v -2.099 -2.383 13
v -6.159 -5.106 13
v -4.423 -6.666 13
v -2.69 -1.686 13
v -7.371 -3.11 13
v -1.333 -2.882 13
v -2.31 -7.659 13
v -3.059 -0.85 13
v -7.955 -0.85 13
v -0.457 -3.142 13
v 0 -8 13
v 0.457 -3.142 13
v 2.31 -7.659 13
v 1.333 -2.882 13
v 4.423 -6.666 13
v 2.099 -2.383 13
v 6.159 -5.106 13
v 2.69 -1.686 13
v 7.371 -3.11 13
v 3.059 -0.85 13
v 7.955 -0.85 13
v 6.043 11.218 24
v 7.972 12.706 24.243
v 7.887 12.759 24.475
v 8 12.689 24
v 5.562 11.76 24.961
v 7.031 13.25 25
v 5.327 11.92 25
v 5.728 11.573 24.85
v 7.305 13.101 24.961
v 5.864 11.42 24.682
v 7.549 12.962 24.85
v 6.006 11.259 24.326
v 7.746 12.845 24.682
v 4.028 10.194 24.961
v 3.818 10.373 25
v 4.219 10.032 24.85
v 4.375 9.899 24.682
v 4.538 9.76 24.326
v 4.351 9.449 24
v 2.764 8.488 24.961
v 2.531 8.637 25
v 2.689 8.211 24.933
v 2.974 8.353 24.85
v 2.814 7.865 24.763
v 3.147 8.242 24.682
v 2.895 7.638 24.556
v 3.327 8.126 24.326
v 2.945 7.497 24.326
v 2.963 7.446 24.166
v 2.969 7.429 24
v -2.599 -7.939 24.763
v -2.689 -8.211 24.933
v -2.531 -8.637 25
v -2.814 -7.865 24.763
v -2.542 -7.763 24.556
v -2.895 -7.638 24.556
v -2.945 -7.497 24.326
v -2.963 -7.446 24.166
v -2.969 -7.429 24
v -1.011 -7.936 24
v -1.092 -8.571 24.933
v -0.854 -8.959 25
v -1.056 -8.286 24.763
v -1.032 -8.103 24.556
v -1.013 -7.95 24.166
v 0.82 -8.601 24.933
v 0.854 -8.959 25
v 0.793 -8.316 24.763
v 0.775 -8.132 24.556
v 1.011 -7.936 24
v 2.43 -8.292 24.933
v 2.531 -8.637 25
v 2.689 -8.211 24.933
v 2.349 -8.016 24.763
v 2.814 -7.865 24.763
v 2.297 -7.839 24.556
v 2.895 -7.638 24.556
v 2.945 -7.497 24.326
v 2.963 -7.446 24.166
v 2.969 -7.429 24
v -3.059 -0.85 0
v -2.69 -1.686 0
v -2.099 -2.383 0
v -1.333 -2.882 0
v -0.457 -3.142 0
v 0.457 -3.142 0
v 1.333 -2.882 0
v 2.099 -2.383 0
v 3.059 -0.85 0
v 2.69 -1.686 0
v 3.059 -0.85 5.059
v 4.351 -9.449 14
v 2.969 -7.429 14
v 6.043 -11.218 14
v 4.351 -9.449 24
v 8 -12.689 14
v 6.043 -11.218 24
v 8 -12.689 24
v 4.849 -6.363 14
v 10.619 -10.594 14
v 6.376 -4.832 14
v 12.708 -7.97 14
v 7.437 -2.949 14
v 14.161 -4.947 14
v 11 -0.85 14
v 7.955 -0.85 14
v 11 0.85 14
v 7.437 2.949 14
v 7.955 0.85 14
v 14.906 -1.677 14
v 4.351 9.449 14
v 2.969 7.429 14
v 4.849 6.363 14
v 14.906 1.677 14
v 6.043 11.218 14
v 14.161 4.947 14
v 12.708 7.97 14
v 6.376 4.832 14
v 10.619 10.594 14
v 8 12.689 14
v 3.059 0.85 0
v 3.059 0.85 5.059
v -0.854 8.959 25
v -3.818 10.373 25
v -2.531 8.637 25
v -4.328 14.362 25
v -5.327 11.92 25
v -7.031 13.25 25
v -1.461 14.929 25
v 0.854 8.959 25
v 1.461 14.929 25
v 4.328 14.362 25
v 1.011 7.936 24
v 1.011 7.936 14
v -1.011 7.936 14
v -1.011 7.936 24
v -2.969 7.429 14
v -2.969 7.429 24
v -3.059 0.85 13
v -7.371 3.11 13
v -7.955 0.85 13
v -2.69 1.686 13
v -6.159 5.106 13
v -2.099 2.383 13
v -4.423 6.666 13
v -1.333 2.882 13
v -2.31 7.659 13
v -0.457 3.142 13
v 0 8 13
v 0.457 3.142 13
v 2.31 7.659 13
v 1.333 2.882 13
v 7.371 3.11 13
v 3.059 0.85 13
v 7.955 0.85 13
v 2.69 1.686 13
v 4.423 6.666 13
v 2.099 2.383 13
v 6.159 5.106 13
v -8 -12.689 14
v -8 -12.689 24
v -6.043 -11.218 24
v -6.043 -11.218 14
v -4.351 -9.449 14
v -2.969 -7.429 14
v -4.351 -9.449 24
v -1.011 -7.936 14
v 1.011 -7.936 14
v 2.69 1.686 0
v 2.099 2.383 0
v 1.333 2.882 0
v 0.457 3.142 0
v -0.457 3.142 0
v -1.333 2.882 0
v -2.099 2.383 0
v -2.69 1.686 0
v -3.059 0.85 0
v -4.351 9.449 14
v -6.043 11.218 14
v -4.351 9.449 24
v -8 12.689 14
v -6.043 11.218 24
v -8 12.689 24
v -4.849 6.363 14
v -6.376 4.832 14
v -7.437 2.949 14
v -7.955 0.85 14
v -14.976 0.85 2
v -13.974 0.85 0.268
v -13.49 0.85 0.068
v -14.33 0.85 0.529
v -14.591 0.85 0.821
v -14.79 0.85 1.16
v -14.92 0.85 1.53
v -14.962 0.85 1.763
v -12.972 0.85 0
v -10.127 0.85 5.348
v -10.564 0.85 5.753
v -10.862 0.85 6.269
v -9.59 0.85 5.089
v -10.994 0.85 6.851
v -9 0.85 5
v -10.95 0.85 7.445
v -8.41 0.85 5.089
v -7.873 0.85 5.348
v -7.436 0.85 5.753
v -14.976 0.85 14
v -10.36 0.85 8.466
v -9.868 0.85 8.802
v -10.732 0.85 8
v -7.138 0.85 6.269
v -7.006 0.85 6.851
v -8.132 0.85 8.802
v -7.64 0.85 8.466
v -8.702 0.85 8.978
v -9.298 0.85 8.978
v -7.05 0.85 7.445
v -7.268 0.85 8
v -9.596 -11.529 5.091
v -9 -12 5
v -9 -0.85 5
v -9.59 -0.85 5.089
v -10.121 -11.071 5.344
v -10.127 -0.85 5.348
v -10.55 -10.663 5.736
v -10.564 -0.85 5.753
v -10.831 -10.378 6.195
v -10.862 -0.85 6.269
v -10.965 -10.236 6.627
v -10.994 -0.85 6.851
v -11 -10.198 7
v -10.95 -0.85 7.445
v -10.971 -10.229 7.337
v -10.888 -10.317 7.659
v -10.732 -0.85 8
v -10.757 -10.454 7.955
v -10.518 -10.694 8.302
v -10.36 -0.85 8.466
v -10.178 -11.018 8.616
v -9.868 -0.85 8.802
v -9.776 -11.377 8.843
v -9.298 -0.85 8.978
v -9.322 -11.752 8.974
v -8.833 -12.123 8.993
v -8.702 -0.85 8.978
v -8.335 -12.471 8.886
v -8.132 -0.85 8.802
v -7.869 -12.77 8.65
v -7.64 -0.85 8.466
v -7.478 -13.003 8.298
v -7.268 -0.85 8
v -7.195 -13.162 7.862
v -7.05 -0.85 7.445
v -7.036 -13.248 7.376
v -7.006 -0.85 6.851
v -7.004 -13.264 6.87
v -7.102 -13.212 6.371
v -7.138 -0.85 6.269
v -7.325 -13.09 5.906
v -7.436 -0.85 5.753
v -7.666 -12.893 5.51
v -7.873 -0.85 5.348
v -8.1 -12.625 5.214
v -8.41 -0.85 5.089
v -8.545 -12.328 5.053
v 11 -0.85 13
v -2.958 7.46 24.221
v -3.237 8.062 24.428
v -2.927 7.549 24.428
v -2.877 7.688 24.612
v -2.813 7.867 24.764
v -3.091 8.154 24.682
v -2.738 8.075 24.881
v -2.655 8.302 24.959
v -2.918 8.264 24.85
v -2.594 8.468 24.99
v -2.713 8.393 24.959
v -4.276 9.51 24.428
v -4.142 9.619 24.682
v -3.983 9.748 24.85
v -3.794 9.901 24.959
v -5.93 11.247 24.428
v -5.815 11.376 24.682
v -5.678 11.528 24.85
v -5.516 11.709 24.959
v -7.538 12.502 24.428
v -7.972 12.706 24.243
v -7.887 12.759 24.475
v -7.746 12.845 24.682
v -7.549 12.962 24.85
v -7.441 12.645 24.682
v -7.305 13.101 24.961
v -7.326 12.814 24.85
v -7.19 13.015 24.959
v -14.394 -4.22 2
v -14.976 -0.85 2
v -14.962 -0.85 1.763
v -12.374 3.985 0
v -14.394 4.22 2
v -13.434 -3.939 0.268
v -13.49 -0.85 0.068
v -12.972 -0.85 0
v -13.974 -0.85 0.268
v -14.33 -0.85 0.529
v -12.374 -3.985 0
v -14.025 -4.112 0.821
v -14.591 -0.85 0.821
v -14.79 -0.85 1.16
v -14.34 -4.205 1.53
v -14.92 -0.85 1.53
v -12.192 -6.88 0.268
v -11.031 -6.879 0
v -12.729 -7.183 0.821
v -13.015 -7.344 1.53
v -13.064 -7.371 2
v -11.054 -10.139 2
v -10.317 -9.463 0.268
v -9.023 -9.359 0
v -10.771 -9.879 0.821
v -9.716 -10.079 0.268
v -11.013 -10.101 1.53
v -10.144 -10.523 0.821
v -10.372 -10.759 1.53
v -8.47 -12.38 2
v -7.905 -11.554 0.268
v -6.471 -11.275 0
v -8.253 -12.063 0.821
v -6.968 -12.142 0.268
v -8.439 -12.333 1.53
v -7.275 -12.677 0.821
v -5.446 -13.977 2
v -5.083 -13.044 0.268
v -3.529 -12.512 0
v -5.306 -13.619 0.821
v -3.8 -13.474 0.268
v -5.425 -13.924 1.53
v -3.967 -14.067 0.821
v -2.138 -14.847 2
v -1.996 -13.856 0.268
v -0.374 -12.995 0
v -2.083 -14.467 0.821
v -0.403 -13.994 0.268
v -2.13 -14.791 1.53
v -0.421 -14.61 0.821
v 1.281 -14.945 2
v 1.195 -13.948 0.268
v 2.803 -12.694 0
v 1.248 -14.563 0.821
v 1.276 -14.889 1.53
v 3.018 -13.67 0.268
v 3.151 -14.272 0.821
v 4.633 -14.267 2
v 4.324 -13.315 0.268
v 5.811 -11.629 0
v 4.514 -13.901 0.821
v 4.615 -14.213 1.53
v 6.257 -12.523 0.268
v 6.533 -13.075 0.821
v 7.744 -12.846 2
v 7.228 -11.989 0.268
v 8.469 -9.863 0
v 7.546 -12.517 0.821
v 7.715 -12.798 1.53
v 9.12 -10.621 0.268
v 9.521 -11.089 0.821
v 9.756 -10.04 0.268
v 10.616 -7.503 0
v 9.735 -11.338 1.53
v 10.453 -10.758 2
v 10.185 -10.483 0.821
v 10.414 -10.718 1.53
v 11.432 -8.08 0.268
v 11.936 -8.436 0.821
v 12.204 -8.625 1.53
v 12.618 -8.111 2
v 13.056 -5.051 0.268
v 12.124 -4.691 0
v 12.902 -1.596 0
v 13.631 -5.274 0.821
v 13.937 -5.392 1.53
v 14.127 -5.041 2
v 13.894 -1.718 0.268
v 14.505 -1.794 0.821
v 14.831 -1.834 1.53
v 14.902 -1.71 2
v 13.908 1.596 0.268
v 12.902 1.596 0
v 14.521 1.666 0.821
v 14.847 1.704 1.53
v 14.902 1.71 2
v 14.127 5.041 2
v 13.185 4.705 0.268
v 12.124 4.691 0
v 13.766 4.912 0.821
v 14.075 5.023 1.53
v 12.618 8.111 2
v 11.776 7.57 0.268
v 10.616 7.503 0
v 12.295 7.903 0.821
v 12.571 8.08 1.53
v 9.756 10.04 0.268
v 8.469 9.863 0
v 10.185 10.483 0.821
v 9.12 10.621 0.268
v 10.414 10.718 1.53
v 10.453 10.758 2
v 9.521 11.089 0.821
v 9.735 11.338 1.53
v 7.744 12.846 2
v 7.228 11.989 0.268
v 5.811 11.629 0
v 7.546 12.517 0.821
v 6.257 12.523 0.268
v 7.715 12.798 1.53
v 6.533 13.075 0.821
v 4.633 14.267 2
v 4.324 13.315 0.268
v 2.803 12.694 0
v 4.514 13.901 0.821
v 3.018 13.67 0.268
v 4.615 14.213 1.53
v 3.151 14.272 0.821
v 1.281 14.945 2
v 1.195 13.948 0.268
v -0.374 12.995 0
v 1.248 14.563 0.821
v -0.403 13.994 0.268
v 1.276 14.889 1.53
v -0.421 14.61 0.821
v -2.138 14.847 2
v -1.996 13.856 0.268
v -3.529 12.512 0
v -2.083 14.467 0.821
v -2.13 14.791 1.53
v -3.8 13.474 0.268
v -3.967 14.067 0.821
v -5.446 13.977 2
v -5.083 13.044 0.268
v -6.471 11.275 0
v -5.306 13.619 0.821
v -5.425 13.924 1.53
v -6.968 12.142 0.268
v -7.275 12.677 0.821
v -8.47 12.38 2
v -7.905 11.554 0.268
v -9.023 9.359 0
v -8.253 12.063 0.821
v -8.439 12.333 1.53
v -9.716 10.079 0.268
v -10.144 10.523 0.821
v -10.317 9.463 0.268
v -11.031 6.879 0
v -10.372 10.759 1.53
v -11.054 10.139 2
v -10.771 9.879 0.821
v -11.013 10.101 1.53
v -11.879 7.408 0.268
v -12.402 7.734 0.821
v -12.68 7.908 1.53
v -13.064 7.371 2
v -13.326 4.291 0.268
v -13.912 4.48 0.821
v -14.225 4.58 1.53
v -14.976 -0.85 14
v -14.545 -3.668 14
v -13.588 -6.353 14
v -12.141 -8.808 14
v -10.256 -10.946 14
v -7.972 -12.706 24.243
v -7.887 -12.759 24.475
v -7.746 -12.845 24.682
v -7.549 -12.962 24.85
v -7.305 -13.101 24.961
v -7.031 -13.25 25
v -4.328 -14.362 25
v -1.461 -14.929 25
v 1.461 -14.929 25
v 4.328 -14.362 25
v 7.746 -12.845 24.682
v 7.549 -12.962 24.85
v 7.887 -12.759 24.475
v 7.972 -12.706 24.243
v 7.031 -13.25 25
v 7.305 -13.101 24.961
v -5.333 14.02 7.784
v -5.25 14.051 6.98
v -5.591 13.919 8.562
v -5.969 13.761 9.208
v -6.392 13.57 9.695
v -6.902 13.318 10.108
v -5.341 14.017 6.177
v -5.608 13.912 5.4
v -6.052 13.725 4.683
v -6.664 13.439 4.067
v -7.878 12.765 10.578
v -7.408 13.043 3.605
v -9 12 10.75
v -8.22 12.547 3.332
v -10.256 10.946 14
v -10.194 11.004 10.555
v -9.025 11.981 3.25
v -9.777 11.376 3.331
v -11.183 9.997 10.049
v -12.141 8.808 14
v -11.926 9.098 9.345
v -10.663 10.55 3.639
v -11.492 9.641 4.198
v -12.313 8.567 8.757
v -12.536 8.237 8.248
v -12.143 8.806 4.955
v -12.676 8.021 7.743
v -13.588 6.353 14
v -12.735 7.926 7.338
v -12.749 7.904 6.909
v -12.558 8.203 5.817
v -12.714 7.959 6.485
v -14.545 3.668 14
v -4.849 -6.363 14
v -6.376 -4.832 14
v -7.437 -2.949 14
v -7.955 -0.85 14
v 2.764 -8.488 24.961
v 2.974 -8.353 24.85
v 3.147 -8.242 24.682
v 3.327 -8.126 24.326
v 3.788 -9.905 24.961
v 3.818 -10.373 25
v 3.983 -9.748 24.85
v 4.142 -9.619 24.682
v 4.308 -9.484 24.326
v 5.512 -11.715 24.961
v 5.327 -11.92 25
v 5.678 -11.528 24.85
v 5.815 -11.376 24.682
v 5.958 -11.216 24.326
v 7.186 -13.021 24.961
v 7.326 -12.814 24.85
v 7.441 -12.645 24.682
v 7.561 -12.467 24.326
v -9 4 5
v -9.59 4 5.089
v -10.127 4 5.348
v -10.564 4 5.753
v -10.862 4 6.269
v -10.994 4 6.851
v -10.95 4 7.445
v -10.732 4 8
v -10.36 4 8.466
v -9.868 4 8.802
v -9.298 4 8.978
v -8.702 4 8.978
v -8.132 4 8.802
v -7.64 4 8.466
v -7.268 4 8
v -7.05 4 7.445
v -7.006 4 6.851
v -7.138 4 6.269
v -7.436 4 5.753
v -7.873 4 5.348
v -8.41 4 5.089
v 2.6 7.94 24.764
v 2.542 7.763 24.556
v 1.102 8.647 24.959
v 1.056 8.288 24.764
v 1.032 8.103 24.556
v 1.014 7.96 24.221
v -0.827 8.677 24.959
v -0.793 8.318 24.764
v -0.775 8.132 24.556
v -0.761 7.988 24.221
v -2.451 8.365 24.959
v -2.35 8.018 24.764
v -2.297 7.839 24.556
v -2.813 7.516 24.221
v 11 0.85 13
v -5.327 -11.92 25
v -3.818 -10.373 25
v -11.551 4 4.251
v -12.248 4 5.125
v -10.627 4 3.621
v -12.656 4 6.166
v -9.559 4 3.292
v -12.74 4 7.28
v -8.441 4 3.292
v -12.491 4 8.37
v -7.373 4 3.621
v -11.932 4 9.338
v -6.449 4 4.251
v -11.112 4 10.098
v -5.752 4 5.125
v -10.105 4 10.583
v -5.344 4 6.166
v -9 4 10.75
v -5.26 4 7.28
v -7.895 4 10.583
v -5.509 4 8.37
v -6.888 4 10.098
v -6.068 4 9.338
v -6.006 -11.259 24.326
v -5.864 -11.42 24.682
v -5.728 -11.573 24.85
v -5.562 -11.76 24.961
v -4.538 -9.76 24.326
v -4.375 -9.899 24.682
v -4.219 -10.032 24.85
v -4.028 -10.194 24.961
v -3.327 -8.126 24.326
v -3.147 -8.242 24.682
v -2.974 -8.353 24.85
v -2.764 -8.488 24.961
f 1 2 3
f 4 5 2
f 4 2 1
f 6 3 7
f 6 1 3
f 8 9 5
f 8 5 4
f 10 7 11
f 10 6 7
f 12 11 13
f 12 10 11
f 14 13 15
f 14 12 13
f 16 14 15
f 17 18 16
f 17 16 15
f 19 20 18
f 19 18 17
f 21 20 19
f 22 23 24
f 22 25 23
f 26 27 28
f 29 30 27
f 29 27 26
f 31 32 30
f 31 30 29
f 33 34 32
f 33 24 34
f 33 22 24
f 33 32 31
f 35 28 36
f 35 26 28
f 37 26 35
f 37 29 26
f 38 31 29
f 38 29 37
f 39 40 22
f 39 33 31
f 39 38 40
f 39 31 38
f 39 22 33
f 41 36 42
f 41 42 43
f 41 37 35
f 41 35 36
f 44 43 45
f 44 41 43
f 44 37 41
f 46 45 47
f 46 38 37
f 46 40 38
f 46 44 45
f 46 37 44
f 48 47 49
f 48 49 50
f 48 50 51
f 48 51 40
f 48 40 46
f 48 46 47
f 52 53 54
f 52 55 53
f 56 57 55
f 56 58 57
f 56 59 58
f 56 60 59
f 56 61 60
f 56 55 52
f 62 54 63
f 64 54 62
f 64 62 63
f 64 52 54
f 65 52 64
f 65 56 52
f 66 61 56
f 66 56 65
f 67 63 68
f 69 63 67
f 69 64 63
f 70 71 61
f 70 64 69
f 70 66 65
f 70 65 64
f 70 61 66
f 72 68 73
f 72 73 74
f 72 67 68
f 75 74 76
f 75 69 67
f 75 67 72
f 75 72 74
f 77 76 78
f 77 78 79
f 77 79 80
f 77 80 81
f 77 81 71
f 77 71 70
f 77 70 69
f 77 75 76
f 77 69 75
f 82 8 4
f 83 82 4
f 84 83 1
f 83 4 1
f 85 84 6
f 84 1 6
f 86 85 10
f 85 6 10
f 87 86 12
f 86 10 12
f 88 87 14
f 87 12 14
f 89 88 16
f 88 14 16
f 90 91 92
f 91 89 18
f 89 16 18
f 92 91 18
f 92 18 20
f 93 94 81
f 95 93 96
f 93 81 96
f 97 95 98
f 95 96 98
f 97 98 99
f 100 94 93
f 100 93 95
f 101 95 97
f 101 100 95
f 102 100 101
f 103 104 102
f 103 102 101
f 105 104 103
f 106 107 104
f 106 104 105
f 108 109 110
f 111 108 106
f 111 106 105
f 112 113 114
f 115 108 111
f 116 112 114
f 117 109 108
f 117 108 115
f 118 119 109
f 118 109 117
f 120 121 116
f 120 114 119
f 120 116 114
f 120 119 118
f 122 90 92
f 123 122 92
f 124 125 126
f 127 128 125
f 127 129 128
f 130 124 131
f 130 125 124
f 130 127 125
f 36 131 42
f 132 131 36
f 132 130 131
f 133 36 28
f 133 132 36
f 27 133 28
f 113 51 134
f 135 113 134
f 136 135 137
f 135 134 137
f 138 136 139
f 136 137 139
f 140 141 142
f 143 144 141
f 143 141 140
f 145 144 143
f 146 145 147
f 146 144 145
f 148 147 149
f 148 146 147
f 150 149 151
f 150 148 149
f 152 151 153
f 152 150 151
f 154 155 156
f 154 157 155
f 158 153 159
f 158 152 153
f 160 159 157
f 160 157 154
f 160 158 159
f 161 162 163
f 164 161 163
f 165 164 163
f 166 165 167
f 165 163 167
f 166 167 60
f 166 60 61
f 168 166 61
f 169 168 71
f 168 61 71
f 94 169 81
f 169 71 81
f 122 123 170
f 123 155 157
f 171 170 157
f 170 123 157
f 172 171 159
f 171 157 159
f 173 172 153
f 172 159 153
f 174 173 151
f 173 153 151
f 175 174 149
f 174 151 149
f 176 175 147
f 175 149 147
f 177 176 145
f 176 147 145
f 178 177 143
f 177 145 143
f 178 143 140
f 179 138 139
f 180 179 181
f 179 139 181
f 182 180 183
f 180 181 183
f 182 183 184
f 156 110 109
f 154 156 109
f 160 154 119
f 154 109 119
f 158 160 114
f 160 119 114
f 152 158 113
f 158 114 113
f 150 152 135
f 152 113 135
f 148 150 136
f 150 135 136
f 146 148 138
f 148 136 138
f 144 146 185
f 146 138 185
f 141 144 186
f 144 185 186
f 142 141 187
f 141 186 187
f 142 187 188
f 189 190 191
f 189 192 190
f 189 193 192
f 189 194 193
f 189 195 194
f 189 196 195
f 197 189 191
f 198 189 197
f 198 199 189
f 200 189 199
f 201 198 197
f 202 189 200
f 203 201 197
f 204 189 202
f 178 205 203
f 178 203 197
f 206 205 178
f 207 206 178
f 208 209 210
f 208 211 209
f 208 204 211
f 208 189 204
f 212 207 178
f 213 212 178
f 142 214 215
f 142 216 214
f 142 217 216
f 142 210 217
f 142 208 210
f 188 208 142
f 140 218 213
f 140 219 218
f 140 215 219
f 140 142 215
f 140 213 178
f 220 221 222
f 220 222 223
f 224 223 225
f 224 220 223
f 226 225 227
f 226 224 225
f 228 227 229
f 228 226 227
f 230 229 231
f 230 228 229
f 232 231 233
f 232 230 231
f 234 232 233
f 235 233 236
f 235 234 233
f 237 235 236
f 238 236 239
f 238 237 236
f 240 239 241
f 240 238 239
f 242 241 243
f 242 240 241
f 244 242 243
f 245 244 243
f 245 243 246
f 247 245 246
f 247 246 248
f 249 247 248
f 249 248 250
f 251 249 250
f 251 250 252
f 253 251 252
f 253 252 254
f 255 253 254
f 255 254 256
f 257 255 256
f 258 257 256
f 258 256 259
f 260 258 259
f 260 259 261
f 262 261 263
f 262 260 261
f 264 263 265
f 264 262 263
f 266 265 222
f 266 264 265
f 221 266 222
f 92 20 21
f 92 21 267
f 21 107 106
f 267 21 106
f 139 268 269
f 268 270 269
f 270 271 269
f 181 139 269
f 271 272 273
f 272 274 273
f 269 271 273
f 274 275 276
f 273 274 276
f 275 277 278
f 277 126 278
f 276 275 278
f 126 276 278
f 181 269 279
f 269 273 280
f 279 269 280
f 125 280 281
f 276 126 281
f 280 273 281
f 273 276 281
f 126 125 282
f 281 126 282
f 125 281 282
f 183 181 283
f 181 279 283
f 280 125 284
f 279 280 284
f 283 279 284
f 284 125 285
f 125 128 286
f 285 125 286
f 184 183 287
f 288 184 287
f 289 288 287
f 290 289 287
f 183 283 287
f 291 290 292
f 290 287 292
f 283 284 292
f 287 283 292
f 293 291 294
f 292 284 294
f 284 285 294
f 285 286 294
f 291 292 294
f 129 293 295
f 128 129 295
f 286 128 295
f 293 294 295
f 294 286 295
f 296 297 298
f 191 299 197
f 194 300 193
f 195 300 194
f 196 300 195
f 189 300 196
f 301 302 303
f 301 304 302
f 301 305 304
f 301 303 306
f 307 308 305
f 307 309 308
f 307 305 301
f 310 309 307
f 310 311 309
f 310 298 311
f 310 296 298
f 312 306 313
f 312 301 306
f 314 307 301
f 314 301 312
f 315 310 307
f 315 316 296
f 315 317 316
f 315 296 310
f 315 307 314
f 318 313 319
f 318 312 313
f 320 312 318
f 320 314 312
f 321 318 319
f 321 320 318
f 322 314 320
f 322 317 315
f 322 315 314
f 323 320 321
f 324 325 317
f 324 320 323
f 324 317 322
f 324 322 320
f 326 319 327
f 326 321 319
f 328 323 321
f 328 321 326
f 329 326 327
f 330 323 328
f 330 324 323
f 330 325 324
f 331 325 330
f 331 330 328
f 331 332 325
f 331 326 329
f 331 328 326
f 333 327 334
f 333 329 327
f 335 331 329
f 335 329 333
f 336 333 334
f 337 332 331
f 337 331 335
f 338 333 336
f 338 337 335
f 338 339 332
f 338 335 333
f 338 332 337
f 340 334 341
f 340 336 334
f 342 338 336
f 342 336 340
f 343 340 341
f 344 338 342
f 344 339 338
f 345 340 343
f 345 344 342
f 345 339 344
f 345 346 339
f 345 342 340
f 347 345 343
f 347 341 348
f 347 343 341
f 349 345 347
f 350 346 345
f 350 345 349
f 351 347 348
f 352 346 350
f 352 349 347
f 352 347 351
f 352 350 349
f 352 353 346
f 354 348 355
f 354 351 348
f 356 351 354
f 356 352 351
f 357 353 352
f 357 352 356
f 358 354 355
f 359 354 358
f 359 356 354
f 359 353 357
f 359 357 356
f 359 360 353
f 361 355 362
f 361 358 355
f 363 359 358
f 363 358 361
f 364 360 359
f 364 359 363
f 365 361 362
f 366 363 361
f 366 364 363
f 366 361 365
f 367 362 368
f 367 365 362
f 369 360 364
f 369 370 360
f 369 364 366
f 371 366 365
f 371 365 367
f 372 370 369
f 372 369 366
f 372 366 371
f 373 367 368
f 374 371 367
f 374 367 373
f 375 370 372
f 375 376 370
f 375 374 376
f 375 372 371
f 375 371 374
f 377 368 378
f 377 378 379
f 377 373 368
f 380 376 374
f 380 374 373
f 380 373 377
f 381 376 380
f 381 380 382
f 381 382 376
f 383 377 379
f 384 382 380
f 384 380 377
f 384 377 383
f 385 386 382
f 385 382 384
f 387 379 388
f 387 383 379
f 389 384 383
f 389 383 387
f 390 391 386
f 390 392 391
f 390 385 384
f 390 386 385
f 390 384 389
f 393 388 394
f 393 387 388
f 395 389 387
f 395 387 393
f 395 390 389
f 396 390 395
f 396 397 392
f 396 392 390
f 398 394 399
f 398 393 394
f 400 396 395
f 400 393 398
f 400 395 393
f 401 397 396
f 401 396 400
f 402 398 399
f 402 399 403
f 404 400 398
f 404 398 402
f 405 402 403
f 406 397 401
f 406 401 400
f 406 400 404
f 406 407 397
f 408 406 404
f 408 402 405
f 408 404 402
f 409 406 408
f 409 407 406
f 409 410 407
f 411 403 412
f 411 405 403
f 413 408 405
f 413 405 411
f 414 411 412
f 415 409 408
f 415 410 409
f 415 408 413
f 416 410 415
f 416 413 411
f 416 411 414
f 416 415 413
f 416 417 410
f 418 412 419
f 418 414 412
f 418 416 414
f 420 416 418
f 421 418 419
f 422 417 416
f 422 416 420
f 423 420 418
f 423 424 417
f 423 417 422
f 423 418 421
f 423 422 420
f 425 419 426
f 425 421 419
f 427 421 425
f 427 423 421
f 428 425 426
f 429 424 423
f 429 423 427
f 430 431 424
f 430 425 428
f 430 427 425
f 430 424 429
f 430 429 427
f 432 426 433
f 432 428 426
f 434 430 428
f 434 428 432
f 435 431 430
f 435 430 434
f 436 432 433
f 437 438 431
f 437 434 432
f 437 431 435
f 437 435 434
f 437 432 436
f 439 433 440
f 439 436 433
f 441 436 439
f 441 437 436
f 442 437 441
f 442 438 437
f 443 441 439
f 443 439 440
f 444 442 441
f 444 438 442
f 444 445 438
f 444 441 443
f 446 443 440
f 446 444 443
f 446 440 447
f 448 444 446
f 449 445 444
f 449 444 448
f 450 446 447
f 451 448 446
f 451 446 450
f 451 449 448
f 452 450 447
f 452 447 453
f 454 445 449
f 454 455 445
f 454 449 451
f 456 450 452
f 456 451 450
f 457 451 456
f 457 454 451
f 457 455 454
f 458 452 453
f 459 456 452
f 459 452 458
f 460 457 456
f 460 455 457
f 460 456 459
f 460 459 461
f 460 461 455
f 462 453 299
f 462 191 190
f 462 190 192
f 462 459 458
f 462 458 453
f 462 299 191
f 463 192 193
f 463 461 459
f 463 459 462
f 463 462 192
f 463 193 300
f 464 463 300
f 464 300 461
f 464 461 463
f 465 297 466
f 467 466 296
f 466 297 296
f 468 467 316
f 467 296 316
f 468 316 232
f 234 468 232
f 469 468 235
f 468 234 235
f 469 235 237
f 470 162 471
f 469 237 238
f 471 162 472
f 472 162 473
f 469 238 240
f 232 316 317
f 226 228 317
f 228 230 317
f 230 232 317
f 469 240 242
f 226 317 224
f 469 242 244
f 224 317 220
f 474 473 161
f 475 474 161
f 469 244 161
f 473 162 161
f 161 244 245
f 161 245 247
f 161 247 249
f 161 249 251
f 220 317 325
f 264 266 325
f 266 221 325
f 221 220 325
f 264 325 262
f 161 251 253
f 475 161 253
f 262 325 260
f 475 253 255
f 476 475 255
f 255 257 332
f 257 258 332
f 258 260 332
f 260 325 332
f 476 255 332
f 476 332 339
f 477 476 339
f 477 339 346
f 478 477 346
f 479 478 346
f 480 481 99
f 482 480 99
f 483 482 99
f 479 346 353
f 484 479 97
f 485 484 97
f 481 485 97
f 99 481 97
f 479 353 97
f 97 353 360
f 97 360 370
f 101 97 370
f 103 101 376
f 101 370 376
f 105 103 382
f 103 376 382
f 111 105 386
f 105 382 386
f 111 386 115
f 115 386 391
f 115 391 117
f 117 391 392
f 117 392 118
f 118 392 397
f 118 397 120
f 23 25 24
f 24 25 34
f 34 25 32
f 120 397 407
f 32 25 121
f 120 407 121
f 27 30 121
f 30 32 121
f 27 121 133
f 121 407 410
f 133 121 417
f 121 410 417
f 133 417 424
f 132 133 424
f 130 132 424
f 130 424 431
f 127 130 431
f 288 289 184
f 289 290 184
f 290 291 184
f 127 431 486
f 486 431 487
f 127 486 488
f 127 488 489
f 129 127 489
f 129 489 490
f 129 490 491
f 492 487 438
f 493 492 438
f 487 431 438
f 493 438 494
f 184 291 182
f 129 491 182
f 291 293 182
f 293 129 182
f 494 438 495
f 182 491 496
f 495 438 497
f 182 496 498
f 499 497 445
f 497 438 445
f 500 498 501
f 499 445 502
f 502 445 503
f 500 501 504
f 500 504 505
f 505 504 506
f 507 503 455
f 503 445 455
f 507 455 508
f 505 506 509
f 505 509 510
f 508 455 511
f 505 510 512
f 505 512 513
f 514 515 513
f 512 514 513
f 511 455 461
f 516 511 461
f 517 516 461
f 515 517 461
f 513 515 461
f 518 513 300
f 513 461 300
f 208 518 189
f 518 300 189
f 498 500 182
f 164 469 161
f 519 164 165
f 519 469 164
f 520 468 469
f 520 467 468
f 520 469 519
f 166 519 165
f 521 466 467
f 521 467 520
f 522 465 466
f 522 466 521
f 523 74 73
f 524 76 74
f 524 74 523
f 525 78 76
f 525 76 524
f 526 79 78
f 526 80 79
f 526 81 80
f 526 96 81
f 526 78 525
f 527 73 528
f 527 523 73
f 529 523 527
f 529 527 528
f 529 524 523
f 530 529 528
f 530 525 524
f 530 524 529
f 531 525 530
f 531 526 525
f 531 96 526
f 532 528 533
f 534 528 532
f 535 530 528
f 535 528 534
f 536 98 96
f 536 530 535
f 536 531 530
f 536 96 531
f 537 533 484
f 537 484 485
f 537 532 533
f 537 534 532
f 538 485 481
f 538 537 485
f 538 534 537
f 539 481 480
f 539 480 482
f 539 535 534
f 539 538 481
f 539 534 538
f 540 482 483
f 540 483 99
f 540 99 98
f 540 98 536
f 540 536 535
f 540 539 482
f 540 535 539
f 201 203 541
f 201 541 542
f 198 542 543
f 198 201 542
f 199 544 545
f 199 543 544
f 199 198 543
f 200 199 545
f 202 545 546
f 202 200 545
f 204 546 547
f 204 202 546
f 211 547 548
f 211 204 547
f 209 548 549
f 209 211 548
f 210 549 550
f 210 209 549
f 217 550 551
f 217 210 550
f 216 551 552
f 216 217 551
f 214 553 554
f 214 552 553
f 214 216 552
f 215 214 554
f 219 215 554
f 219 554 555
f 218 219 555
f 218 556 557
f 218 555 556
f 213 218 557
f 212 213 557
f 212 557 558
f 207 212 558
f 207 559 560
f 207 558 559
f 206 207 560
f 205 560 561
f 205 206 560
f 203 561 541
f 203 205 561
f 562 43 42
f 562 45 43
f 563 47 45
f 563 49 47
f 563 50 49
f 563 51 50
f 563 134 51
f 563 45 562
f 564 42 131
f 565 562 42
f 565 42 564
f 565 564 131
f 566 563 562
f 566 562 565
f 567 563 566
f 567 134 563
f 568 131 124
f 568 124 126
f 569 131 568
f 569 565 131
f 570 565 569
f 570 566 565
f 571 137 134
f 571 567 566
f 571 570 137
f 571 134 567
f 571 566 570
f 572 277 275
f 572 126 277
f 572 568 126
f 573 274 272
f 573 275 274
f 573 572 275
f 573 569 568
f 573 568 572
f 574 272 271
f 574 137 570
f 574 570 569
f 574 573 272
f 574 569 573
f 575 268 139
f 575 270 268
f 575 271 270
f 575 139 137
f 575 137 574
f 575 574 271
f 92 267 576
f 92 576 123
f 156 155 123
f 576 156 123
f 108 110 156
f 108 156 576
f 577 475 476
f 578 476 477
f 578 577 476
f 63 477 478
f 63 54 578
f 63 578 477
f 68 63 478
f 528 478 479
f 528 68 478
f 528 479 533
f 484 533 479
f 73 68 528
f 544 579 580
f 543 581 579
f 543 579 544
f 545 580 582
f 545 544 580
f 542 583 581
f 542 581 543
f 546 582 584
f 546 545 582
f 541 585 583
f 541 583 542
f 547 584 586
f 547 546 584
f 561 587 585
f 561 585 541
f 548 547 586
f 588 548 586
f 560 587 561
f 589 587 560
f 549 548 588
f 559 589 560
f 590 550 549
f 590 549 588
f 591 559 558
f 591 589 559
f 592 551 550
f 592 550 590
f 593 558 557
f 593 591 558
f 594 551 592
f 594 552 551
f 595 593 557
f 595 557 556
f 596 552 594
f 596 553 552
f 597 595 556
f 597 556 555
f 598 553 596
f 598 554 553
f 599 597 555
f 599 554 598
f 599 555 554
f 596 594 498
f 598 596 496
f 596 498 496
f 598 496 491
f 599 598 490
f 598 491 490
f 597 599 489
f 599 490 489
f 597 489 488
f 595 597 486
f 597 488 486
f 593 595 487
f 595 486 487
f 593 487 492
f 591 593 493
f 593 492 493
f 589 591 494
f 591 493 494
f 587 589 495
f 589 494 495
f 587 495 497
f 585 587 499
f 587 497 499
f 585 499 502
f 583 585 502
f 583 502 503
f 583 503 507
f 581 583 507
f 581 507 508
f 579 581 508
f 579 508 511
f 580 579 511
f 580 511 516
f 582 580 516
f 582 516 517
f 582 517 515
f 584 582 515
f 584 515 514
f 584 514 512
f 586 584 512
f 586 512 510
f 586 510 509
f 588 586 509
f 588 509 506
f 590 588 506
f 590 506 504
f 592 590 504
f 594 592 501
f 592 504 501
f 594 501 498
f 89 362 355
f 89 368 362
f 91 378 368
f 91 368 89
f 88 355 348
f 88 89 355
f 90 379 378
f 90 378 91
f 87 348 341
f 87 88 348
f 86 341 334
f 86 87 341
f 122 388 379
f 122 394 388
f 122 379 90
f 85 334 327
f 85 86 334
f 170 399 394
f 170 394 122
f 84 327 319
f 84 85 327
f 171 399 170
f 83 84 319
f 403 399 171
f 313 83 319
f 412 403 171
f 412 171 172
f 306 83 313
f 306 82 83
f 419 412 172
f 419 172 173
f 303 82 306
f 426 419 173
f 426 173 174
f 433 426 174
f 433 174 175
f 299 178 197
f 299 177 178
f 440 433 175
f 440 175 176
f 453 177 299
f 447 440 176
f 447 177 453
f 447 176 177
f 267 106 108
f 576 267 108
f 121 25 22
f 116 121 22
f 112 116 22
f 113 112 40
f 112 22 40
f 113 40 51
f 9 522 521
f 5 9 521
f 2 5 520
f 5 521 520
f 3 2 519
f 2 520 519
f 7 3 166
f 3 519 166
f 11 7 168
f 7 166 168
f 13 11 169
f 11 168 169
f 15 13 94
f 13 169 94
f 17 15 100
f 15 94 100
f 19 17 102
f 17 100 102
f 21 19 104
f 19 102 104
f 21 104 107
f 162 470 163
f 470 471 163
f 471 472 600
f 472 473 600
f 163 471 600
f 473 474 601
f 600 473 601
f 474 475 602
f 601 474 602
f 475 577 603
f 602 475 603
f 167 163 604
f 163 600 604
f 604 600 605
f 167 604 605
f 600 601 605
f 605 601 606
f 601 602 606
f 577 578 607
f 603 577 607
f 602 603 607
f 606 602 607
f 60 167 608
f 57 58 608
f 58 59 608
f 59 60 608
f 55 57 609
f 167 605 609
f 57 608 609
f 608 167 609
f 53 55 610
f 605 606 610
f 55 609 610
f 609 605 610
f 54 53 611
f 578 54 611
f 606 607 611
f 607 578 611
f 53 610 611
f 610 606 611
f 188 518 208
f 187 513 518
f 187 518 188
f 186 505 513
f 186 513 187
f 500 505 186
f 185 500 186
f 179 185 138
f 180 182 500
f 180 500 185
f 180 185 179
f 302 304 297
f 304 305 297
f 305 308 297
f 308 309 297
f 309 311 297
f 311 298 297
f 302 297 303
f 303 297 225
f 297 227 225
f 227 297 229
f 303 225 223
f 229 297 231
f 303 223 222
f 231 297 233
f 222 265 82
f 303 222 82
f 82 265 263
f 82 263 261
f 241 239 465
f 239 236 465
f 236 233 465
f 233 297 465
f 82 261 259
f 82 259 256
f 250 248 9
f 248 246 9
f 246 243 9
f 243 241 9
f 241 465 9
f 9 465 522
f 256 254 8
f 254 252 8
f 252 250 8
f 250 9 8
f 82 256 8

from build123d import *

# Parameters (mm, degrees)
SKETCH1_R               = 15
BOSS_EXTRUDE1_DEPTH     = 25
CUT_EXTRUDE1_DEPTH      = 11
SKETCH4_R               = 3.175
CUT_EXTRUDE2_DEPTH      = 14
SKETCH5_R               = 8
CUT_EXTRUDE3_DEPTH      = 1
SKETCH6_W               = 28.841933153
SKETCH6_H               = 1.7
CUT_EXTRUDE4_DEPTH      = 14
SKETCH7_W               = 7.940894739
SKETCH7_H               = 1.7
BOSS_EXTRUDE2_DEPTH     = 2
CHAMFER1_SIZE           = 11
CUT_EXTRUDE5_DEPTH      = 14
CUT_EXTRUDE5_DEPTH_BACK = 14
SKETCH8_R               = 2
SKETCH9_R               = 3.75
CUT_EXTRUDE6_DEPTH      = 11
FILLET1_R               = 2
FILLET2_R               = 1


with BuildPart() as part:
    # Sketch1 → Boss-Extrude1 (new body)
    with BuildSketch(Plane.XY):
        Circle(SKETCH1_R)
    extrude(amount=BOSS_EXTRUDE1_DEPTH)

    # Sketch3 → Cut-Extrude1 (cut)
    with BuildSketch(Plane.XY.offset(25)):
        with BuildLine():
            ThreePointArc((2.96875, -7.428763251), (31, 0), (2.96875, 7.428763251))
            ThreePointArc((2.96875, 7.428763251), (0, 8), (-2.96875, 7.428763251))
            ThreePointArc((-2.96875, 7.428763251), (-31, 0), (-2.96875, -7.428763251))
            ThreePointArc((-2.96875, -7.428763251), (0, -8), (2.96875, -7.428763251))
        make_face()
    extrude(amount=-CUT_EXTRUDE1_DEPTH, mode=Mode.SUBTRACT)

    # Sketch4 → Cut-Extrude2 (cut)
    with BuildSketch(Plane.XY.offset(14)):
        Circle(SKETCH4_R)
    extrude(amount=-CUT_EXTRUDE2_DEPTH, mode=Mode.SUBTRACT)

    # Sketch5 → Cut-Extrude3 (cut)
    with BuildSketch(Plane.XY.offset(14)):
        Circle(SKETCH5_R)
    extrude(amount=-CUT_EXTRUDE3_DEPTH, mode=Mode.SUBTRACT)

    # Sketch6 → Cut-Extrude4 (cut)
    with BuildSketch(Plane.XY.offset(14)):
        with Locations((-3.420966576, 0)):
            Rectangle(SKETCH6_W, SKETCH6_H)
    extrude(amount=-CUT_EXTRUDE4_DEPTH, mode=Mode.SUBTRACT)

    # Sketch7 → Boss-Extrude2 (add)
    with BuildSketch(Plane(origin=(0, 0, 0), x_dir=(-1, 0, 0), z_dir=(0, 0, -1))):
        with Locations((-7.02955263, 0)):
            Rectangle(SKETCH7_W, SKETCH7_H)
    extrude(amount=-BOSS_EXTRUDE2_DEPTH)

    # Chamfer1
    # the kernel refuses this chamfer: 11 mm, written as the material it adds along each edge
    with BuildSketch(Plane(origin=(11, -0.85, 2), x_dir=(0.027495876610586414, 0, 0.9996219169112968), z_dir=(0, 1, 0))) as chamfer1_piece_1_section:
        Polygon((CHAMFER1_SIZE * 0.999621916911, -CHAMFER1_SIZE * 0.0274958766106), (-CHAMFER1_SIZE * 0.0274958766106, -CHAMFER1_SIZE * 0.999621916911), (0, 0), align=None)
    chamfer1_piece_1 = extrude(amount=1.7, mode=Mode.PRIVATE)
    chamfer1_piece_1 = split(chamfer1_piece_1, bisect_by=Plane(origin=(3.059105261, 0, 5.913893193), z_dir=(1, 0, 0)), keep=Keep.TOP, mode=Mode.PRIVATE)
    add(chamfer1_piece_1)

    # Sketch8 → Cut-Extrude5 (cut, two sides: drawn at the far end of the back side and taken through both)
    with BuildSketch(Plane(origin=(0, 0, 0), x_dir=(1, 0, 0), z_dir=(0, 1, 0)).offset(-CUT_EXTRUDE5_DEPTH_BACK)):
        with Locations(Location((-9, -7, 0), (0, 0, 90))):
            Circle(SKETCH8_R)
    extrude(amount=CUT_EXTRUDE5_DEPTH + CUT_EXTRUDE5_DEPTH_BACK, mode=Mode.SUBTRACT)

    # Sketch9 → Cut-Extrude6 (cut)
    with BuildSketch(Plane(origin=(0, 15, 0), x_dir=(1, 0, 0), z_dir=(0, 1, 0))):
        with Locations(Location((-9, -7, 0), (0, 0, 270))):
            Circle(SKETCH9_R)
    extrude(amount=-CUT_EXTRUDE6_DEPTH, mode=Mode.SUBTRACT)

    # Fillet1
    fillet1_edges = [part.edges().sort_by_distance(p)[0] for p in [
        (15, 0, 0),
    ]]
    fillet(fillet1_edges, radius=FILLET1_R)

    # Fillet2
    fillet2_edges = [part.edges().sort_by_distance(p)[0] for p in [
        (-5.160499055, 10.368472369, 25),
        (0, -8, 25),
        (5.160499055, -10.368472369, 25),
        (0, 8, 25),
        (-5.160499055, -10.368472369, 25),
        (5.160499055, 10.368472369, 25),
    ]]
    fillet(fillet2_edges, radius=FILLET2_R)


solid = part.part
